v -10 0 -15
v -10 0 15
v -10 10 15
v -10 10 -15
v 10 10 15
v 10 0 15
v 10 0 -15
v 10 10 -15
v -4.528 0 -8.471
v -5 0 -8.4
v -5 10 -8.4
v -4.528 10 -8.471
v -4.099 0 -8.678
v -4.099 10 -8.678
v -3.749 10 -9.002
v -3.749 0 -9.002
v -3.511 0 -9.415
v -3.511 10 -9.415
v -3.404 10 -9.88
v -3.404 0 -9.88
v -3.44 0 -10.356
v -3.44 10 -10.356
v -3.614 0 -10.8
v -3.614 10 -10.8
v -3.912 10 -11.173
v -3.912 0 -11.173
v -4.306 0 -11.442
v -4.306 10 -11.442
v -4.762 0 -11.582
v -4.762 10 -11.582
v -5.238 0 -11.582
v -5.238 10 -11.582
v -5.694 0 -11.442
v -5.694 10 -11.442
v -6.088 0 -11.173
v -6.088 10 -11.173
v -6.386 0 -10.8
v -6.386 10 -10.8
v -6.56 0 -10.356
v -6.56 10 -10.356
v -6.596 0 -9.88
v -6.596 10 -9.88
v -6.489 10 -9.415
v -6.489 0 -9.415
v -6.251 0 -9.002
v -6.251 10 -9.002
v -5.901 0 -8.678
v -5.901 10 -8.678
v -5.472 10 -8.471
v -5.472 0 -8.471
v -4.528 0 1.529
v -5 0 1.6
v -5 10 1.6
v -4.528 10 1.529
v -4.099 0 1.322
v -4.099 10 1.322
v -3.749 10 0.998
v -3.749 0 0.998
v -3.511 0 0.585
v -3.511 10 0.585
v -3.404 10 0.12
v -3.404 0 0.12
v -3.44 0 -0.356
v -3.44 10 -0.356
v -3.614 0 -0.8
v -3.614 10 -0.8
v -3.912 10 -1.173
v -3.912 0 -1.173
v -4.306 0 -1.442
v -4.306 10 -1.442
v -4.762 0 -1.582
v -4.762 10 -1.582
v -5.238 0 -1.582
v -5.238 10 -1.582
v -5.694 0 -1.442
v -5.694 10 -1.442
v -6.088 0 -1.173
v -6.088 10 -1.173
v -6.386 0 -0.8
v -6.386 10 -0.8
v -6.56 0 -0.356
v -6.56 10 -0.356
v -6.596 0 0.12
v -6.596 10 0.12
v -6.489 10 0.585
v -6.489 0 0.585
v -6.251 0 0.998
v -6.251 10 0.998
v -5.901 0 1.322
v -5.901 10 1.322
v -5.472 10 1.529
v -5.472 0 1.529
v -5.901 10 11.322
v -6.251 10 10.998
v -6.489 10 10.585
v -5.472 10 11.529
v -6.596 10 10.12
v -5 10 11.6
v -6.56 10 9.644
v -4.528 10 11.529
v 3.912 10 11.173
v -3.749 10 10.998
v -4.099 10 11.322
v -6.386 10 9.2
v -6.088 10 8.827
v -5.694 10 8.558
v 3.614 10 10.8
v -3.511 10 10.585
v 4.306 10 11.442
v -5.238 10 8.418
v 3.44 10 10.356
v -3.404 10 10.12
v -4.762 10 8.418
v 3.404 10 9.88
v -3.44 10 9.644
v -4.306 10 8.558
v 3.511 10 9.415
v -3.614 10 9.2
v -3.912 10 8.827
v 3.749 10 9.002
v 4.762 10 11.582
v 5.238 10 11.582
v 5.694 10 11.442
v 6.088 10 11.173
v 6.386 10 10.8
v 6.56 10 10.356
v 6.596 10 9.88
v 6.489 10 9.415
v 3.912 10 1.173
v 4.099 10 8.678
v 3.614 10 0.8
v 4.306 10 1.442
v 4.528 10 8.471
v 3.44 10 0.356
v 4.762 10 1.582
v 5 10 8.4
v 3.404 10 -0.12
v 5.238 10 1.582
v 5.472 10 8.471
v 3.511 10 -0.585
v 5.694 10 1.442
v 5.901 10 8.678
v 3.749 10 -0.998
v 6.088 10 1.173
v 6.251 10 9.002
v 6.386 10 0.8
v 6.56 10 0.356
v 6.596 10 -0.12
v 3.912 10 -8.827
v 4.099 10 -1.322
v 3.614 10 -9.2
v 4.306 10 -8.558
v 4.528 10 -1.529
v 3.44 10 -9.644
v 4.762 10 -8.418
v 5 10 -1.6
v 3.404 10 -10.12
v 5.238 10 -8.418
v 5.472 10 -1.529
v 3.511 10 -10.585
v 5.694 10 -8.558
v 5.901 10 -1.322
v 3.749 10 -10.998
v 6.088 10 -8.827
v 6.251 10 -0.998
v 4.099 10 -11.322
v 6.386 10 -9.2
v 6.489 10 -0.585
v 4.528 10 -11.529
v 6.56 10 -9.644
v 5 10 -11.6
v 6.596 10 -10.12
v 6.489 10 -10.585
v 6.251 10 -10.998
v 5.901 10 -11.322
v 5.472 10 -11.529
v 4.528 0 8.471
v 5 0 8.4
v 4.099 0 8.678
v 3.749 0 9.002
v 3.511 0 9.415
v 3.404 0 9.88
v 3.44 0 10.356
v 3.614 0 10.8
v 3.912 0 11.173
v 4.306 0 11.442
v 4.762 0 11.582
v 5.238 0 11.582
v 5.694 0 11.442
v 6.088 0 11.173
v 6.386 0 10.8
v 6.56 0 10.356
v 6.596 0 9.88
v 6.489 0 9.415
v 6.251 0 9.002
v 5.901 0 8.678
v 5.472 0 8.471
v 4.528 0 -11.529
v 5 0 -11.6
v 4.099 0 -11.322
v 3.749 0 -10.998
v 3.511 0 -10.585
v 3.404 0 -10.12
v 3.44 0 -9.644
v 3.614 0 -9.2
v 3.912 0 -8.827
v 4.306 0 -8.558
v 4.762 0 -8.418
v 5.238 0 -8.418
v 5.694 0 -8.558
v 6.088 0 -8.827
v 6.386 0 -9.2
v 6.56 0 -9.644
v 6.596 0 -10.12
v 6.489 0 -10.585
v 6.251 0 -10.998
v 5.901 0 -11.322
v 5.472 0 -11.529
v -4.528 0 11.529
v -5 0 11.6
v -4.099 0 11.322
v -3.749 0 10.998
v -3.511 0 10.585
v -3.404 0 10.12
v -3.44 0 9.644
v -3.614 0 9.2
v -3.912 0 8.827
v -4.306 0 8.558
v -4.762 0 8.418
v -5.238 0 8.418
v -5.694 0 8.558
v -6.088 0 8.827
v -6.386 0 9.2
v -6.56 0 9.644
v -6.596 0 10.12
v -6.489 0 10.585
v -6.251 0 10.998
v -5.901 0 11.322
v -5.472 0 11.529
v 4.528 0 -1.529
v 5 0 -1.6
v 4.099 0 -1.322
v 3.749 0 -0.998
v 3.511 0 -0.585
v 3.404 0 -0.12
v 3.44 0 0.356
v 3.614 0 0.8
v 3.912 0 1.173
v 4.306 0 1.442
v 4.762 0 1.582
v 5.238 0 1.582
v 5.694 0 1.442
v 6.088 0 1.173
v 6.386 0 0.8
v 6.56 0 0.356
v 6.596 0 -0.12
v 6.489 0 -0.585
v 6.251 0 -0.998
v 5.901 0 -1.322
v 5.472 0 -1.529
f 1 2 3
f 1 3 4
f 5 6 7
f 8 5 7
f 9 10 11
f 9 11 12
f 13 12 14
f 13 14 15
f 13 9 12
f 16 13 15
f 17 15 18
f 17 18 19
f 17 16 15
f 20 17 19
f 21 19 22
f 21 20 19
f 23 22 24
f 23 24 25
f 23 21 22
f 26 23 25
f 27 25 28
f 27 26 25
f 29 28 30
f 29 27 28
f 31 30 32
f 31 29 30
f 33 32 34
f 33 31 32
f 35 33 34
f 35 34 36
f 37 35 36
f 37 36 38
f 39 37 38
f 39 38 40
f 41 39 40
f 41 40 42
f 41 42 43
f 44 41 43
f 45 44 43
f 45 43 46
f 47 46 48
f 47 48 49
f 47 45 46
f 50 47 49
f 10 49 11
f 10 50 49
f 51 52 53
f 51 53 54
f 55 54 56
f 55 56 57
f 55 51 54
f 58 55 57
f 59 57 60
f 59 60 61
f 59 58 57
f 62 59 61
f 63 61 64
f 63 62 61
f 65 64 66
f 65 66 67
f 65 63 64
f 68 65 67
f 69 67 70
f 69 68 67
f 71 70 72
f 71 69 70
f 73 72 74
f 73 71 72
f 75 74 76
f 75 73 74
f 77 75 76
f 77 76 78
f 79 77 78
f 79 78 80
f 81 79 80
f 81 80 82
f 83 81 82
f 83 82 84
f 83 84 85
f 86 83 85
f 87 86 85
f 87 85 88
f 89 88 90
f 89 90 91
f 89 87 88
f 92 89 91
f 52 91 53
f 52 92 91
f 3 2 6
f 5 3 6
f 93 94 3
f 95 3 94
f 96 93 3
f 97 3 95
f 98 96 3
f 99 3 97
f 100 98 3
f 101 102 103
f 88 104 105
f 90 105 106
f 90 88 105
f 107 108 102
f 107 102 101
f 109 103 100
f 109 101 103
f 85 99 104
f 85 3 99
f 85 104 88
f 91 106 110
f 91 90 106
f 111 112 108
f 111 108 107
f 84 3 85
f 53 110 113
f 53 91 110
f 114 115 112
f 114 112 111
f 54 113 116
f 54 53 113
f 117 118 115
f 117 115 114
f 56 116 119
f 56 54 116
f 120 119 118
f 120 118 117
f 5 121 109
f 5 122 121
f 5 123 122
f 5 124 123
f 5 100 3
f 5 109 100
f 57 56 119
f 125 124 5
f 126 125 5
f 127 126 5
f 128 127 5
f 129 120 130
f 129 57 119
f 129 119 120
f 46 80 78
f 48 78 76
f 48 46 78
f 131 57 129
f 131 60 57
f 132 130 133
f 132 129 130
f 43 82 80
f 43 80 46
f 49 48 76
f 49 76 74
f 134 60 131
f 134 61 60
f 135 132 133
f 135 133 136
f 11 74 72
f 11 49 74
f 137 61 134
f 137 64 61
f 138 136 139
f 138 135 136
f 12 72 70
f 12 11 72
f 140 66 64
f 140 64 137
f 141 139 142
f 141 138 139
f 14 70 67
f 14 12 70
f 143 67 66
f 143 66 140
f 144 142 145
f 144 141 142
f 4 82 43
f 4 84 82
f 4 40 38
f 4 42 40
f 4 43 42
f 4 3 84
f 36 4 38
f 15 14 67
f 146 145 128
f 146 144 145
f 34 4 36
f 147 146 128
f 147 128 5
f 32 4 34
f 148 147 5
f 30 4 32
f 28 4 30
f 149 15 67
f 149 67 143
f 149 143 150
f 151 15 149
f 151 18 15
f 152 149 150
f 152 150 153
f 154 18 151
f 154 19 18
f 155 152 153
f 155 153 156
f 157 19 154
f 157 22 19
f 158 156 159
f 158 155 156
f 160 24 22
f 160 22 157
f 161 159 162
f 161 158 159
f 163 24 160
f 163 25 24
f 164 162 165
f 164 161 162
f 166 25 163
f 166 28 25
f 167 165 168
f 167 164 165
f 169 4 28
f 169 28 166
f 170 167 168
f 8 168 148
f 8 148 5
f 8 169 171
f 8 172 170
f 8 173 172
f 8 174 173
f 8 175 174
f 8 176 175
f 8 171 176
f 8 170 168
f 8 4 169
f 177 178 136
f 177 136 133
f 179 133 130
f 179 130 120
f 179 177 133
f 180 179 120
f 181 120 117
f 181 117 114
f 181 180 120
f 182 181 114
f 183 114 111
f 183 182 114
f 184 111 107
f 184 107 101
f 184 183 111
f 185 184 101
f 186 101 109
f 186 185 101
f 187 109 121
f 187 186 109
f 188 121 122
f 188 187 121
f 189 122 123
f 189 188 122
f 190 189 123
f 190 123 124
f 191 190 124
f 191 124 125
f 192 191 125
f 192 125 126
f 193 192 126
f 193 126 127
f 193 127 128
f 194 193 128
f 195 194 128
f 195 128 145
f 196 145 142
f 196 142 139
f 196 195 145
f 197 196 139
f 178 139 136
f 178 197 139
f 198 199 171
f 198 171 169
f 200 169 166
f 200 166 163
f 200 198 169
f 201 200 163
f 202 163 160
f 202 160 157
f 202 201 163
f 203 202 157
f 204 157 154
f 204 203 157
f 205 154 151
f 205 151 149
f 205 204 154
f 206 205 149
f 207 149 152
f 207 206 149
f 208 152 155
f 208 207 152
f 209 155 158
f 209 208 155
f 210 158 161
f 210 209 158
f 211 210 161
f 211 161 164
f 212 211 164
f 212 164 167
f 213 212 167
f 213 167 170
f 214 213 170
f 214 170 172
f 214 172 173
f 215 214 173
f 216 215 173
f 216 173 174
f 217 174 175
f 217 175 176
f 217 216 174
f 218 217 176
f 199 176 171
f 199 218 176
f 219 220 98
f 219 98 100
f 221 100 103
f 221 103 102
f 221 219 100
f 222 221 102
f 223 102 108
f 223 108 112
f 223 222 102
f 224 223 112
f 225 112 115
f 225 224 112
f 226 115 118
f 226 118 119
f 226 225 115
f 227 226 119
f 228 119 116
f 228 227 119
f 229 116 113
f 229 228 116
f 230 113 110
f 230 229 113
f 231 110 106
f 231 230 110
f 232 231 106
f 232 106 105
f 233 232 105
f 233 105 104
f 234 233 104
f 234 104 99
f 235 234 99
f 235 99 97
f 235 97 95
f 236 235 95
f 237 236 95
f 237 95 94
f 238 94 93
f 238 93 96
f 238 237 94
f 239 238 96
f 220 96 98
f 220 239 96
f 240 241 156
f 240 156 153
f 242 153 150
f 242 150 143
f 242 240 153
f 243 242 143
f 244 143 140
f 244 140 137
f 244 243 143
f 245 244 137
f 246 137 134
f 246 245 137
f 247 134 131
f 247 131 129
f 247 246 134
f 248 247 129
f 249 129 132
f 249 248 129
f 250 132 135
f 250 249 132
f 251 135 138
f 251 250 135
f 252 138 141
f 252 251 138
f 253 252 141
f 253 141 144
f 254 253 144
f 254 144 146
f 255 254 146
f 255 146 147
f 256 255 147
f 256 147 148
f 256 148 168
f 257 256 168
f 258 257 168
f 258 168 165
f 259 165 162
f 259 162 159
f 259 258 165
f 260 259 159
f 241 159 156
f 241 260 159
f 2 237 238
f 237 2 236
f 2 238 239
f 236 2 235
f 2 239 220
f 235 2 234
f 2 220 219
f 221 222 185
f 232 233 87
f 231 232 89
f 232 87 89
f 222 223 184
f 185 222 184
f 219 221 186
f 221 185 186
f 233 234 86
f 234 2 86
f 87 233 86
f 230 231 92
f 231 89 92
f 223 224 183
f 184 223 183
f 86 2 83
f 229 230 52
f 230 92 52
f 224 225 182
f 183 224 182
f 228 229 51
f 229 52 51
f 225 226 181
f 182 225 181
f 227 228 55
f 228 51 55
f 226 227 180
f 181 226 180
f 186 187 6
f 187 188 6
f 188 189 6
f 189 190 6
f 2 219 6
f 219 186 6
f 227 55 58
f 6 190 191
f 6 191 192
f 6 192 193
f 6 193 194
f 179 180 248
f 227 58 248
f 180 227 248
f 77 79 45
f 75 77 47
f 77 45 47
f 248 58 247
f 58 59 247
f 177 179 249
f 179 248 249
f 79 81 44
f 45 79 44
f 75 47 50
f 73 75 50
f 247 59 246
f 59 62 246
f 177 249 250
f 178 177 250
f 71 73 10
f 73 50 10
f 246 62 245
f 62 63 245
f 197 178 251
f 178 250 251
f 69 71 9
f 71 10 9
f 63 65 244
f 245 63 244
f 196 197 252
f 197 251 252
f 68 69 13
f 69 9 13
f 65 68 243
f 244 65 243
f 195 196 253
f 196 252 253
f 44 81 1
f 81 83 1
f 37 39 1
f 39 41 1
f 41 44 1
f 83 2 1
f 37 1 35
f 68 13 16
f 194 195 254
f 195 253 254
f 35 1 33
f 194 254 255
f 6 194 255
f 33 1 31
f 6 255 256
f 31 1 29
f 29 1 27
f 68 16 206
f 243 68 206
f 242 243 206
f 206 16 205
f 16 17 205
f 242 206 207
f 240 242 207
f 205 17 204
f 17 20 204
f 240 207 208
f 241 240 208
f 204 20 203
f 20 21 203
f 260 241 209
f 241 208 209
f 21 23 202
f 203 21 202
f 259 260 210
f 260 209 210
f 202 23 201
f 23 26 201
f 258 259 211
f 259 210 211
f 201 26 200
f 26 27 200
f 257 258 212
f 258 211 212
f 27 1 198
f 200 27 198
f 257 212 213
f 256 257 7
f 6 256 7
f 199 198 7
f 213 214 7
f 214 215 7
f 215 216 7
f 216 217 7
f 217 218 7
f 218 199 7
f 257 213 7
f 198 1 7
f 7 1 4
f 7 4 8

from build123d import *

# Parameters (mm, degrees)
SKETCH_1_W      = 20
SKETCH_1_H      = 30
SKETCH_1_R      = 1.6
EXTRUDE_1_DEPTH = 10


with BuildPart() as part:
    # 草图1 → 凸台-拉伸1 (new body)
    with BuildSketch(Plane(origin=(0, 0, 0), x_dir=(1, 0, 0), z_dir=(0, 1, 0))):
        Rectangle(SKETCH_1_W, SKETCH_1_H)
        with Locations(Location((-5, 0, 0), (0, 0, 270))):
            Circle(SKETCH_1_R, mode=Mode.SUBTRACT)
        with Locations(Location((-5, 10, 0), (0, 0, 270))):
            Circle(SKETCH_1_R, mode=Mode.SUBTRACT)
        with Locations(Location((-5, -10, 0), (0, 0, 270))):
            Circle(SKETCH_1_R, mode=Mode.SUBTRACT)
        with Locations(Location((5, -10, 0), (0, 0, 90))):
            Circle(SKETCH_1_R, mode=Mode.SUBTRACT)
        with Locations(Location((5, 0, 0), (0, 0, 90))):
            Circle(SKETCH_1_R, mode=Mode.SUBTRACT)
        with Locations(Location((5, 10, 0), (0, 0, 90))):
            Circle(SKETCH_1_R, mode=Mode.SUBTRACT)
    extrude(amount=EXTRUDE_1_DEPTH)


solid = part.part
